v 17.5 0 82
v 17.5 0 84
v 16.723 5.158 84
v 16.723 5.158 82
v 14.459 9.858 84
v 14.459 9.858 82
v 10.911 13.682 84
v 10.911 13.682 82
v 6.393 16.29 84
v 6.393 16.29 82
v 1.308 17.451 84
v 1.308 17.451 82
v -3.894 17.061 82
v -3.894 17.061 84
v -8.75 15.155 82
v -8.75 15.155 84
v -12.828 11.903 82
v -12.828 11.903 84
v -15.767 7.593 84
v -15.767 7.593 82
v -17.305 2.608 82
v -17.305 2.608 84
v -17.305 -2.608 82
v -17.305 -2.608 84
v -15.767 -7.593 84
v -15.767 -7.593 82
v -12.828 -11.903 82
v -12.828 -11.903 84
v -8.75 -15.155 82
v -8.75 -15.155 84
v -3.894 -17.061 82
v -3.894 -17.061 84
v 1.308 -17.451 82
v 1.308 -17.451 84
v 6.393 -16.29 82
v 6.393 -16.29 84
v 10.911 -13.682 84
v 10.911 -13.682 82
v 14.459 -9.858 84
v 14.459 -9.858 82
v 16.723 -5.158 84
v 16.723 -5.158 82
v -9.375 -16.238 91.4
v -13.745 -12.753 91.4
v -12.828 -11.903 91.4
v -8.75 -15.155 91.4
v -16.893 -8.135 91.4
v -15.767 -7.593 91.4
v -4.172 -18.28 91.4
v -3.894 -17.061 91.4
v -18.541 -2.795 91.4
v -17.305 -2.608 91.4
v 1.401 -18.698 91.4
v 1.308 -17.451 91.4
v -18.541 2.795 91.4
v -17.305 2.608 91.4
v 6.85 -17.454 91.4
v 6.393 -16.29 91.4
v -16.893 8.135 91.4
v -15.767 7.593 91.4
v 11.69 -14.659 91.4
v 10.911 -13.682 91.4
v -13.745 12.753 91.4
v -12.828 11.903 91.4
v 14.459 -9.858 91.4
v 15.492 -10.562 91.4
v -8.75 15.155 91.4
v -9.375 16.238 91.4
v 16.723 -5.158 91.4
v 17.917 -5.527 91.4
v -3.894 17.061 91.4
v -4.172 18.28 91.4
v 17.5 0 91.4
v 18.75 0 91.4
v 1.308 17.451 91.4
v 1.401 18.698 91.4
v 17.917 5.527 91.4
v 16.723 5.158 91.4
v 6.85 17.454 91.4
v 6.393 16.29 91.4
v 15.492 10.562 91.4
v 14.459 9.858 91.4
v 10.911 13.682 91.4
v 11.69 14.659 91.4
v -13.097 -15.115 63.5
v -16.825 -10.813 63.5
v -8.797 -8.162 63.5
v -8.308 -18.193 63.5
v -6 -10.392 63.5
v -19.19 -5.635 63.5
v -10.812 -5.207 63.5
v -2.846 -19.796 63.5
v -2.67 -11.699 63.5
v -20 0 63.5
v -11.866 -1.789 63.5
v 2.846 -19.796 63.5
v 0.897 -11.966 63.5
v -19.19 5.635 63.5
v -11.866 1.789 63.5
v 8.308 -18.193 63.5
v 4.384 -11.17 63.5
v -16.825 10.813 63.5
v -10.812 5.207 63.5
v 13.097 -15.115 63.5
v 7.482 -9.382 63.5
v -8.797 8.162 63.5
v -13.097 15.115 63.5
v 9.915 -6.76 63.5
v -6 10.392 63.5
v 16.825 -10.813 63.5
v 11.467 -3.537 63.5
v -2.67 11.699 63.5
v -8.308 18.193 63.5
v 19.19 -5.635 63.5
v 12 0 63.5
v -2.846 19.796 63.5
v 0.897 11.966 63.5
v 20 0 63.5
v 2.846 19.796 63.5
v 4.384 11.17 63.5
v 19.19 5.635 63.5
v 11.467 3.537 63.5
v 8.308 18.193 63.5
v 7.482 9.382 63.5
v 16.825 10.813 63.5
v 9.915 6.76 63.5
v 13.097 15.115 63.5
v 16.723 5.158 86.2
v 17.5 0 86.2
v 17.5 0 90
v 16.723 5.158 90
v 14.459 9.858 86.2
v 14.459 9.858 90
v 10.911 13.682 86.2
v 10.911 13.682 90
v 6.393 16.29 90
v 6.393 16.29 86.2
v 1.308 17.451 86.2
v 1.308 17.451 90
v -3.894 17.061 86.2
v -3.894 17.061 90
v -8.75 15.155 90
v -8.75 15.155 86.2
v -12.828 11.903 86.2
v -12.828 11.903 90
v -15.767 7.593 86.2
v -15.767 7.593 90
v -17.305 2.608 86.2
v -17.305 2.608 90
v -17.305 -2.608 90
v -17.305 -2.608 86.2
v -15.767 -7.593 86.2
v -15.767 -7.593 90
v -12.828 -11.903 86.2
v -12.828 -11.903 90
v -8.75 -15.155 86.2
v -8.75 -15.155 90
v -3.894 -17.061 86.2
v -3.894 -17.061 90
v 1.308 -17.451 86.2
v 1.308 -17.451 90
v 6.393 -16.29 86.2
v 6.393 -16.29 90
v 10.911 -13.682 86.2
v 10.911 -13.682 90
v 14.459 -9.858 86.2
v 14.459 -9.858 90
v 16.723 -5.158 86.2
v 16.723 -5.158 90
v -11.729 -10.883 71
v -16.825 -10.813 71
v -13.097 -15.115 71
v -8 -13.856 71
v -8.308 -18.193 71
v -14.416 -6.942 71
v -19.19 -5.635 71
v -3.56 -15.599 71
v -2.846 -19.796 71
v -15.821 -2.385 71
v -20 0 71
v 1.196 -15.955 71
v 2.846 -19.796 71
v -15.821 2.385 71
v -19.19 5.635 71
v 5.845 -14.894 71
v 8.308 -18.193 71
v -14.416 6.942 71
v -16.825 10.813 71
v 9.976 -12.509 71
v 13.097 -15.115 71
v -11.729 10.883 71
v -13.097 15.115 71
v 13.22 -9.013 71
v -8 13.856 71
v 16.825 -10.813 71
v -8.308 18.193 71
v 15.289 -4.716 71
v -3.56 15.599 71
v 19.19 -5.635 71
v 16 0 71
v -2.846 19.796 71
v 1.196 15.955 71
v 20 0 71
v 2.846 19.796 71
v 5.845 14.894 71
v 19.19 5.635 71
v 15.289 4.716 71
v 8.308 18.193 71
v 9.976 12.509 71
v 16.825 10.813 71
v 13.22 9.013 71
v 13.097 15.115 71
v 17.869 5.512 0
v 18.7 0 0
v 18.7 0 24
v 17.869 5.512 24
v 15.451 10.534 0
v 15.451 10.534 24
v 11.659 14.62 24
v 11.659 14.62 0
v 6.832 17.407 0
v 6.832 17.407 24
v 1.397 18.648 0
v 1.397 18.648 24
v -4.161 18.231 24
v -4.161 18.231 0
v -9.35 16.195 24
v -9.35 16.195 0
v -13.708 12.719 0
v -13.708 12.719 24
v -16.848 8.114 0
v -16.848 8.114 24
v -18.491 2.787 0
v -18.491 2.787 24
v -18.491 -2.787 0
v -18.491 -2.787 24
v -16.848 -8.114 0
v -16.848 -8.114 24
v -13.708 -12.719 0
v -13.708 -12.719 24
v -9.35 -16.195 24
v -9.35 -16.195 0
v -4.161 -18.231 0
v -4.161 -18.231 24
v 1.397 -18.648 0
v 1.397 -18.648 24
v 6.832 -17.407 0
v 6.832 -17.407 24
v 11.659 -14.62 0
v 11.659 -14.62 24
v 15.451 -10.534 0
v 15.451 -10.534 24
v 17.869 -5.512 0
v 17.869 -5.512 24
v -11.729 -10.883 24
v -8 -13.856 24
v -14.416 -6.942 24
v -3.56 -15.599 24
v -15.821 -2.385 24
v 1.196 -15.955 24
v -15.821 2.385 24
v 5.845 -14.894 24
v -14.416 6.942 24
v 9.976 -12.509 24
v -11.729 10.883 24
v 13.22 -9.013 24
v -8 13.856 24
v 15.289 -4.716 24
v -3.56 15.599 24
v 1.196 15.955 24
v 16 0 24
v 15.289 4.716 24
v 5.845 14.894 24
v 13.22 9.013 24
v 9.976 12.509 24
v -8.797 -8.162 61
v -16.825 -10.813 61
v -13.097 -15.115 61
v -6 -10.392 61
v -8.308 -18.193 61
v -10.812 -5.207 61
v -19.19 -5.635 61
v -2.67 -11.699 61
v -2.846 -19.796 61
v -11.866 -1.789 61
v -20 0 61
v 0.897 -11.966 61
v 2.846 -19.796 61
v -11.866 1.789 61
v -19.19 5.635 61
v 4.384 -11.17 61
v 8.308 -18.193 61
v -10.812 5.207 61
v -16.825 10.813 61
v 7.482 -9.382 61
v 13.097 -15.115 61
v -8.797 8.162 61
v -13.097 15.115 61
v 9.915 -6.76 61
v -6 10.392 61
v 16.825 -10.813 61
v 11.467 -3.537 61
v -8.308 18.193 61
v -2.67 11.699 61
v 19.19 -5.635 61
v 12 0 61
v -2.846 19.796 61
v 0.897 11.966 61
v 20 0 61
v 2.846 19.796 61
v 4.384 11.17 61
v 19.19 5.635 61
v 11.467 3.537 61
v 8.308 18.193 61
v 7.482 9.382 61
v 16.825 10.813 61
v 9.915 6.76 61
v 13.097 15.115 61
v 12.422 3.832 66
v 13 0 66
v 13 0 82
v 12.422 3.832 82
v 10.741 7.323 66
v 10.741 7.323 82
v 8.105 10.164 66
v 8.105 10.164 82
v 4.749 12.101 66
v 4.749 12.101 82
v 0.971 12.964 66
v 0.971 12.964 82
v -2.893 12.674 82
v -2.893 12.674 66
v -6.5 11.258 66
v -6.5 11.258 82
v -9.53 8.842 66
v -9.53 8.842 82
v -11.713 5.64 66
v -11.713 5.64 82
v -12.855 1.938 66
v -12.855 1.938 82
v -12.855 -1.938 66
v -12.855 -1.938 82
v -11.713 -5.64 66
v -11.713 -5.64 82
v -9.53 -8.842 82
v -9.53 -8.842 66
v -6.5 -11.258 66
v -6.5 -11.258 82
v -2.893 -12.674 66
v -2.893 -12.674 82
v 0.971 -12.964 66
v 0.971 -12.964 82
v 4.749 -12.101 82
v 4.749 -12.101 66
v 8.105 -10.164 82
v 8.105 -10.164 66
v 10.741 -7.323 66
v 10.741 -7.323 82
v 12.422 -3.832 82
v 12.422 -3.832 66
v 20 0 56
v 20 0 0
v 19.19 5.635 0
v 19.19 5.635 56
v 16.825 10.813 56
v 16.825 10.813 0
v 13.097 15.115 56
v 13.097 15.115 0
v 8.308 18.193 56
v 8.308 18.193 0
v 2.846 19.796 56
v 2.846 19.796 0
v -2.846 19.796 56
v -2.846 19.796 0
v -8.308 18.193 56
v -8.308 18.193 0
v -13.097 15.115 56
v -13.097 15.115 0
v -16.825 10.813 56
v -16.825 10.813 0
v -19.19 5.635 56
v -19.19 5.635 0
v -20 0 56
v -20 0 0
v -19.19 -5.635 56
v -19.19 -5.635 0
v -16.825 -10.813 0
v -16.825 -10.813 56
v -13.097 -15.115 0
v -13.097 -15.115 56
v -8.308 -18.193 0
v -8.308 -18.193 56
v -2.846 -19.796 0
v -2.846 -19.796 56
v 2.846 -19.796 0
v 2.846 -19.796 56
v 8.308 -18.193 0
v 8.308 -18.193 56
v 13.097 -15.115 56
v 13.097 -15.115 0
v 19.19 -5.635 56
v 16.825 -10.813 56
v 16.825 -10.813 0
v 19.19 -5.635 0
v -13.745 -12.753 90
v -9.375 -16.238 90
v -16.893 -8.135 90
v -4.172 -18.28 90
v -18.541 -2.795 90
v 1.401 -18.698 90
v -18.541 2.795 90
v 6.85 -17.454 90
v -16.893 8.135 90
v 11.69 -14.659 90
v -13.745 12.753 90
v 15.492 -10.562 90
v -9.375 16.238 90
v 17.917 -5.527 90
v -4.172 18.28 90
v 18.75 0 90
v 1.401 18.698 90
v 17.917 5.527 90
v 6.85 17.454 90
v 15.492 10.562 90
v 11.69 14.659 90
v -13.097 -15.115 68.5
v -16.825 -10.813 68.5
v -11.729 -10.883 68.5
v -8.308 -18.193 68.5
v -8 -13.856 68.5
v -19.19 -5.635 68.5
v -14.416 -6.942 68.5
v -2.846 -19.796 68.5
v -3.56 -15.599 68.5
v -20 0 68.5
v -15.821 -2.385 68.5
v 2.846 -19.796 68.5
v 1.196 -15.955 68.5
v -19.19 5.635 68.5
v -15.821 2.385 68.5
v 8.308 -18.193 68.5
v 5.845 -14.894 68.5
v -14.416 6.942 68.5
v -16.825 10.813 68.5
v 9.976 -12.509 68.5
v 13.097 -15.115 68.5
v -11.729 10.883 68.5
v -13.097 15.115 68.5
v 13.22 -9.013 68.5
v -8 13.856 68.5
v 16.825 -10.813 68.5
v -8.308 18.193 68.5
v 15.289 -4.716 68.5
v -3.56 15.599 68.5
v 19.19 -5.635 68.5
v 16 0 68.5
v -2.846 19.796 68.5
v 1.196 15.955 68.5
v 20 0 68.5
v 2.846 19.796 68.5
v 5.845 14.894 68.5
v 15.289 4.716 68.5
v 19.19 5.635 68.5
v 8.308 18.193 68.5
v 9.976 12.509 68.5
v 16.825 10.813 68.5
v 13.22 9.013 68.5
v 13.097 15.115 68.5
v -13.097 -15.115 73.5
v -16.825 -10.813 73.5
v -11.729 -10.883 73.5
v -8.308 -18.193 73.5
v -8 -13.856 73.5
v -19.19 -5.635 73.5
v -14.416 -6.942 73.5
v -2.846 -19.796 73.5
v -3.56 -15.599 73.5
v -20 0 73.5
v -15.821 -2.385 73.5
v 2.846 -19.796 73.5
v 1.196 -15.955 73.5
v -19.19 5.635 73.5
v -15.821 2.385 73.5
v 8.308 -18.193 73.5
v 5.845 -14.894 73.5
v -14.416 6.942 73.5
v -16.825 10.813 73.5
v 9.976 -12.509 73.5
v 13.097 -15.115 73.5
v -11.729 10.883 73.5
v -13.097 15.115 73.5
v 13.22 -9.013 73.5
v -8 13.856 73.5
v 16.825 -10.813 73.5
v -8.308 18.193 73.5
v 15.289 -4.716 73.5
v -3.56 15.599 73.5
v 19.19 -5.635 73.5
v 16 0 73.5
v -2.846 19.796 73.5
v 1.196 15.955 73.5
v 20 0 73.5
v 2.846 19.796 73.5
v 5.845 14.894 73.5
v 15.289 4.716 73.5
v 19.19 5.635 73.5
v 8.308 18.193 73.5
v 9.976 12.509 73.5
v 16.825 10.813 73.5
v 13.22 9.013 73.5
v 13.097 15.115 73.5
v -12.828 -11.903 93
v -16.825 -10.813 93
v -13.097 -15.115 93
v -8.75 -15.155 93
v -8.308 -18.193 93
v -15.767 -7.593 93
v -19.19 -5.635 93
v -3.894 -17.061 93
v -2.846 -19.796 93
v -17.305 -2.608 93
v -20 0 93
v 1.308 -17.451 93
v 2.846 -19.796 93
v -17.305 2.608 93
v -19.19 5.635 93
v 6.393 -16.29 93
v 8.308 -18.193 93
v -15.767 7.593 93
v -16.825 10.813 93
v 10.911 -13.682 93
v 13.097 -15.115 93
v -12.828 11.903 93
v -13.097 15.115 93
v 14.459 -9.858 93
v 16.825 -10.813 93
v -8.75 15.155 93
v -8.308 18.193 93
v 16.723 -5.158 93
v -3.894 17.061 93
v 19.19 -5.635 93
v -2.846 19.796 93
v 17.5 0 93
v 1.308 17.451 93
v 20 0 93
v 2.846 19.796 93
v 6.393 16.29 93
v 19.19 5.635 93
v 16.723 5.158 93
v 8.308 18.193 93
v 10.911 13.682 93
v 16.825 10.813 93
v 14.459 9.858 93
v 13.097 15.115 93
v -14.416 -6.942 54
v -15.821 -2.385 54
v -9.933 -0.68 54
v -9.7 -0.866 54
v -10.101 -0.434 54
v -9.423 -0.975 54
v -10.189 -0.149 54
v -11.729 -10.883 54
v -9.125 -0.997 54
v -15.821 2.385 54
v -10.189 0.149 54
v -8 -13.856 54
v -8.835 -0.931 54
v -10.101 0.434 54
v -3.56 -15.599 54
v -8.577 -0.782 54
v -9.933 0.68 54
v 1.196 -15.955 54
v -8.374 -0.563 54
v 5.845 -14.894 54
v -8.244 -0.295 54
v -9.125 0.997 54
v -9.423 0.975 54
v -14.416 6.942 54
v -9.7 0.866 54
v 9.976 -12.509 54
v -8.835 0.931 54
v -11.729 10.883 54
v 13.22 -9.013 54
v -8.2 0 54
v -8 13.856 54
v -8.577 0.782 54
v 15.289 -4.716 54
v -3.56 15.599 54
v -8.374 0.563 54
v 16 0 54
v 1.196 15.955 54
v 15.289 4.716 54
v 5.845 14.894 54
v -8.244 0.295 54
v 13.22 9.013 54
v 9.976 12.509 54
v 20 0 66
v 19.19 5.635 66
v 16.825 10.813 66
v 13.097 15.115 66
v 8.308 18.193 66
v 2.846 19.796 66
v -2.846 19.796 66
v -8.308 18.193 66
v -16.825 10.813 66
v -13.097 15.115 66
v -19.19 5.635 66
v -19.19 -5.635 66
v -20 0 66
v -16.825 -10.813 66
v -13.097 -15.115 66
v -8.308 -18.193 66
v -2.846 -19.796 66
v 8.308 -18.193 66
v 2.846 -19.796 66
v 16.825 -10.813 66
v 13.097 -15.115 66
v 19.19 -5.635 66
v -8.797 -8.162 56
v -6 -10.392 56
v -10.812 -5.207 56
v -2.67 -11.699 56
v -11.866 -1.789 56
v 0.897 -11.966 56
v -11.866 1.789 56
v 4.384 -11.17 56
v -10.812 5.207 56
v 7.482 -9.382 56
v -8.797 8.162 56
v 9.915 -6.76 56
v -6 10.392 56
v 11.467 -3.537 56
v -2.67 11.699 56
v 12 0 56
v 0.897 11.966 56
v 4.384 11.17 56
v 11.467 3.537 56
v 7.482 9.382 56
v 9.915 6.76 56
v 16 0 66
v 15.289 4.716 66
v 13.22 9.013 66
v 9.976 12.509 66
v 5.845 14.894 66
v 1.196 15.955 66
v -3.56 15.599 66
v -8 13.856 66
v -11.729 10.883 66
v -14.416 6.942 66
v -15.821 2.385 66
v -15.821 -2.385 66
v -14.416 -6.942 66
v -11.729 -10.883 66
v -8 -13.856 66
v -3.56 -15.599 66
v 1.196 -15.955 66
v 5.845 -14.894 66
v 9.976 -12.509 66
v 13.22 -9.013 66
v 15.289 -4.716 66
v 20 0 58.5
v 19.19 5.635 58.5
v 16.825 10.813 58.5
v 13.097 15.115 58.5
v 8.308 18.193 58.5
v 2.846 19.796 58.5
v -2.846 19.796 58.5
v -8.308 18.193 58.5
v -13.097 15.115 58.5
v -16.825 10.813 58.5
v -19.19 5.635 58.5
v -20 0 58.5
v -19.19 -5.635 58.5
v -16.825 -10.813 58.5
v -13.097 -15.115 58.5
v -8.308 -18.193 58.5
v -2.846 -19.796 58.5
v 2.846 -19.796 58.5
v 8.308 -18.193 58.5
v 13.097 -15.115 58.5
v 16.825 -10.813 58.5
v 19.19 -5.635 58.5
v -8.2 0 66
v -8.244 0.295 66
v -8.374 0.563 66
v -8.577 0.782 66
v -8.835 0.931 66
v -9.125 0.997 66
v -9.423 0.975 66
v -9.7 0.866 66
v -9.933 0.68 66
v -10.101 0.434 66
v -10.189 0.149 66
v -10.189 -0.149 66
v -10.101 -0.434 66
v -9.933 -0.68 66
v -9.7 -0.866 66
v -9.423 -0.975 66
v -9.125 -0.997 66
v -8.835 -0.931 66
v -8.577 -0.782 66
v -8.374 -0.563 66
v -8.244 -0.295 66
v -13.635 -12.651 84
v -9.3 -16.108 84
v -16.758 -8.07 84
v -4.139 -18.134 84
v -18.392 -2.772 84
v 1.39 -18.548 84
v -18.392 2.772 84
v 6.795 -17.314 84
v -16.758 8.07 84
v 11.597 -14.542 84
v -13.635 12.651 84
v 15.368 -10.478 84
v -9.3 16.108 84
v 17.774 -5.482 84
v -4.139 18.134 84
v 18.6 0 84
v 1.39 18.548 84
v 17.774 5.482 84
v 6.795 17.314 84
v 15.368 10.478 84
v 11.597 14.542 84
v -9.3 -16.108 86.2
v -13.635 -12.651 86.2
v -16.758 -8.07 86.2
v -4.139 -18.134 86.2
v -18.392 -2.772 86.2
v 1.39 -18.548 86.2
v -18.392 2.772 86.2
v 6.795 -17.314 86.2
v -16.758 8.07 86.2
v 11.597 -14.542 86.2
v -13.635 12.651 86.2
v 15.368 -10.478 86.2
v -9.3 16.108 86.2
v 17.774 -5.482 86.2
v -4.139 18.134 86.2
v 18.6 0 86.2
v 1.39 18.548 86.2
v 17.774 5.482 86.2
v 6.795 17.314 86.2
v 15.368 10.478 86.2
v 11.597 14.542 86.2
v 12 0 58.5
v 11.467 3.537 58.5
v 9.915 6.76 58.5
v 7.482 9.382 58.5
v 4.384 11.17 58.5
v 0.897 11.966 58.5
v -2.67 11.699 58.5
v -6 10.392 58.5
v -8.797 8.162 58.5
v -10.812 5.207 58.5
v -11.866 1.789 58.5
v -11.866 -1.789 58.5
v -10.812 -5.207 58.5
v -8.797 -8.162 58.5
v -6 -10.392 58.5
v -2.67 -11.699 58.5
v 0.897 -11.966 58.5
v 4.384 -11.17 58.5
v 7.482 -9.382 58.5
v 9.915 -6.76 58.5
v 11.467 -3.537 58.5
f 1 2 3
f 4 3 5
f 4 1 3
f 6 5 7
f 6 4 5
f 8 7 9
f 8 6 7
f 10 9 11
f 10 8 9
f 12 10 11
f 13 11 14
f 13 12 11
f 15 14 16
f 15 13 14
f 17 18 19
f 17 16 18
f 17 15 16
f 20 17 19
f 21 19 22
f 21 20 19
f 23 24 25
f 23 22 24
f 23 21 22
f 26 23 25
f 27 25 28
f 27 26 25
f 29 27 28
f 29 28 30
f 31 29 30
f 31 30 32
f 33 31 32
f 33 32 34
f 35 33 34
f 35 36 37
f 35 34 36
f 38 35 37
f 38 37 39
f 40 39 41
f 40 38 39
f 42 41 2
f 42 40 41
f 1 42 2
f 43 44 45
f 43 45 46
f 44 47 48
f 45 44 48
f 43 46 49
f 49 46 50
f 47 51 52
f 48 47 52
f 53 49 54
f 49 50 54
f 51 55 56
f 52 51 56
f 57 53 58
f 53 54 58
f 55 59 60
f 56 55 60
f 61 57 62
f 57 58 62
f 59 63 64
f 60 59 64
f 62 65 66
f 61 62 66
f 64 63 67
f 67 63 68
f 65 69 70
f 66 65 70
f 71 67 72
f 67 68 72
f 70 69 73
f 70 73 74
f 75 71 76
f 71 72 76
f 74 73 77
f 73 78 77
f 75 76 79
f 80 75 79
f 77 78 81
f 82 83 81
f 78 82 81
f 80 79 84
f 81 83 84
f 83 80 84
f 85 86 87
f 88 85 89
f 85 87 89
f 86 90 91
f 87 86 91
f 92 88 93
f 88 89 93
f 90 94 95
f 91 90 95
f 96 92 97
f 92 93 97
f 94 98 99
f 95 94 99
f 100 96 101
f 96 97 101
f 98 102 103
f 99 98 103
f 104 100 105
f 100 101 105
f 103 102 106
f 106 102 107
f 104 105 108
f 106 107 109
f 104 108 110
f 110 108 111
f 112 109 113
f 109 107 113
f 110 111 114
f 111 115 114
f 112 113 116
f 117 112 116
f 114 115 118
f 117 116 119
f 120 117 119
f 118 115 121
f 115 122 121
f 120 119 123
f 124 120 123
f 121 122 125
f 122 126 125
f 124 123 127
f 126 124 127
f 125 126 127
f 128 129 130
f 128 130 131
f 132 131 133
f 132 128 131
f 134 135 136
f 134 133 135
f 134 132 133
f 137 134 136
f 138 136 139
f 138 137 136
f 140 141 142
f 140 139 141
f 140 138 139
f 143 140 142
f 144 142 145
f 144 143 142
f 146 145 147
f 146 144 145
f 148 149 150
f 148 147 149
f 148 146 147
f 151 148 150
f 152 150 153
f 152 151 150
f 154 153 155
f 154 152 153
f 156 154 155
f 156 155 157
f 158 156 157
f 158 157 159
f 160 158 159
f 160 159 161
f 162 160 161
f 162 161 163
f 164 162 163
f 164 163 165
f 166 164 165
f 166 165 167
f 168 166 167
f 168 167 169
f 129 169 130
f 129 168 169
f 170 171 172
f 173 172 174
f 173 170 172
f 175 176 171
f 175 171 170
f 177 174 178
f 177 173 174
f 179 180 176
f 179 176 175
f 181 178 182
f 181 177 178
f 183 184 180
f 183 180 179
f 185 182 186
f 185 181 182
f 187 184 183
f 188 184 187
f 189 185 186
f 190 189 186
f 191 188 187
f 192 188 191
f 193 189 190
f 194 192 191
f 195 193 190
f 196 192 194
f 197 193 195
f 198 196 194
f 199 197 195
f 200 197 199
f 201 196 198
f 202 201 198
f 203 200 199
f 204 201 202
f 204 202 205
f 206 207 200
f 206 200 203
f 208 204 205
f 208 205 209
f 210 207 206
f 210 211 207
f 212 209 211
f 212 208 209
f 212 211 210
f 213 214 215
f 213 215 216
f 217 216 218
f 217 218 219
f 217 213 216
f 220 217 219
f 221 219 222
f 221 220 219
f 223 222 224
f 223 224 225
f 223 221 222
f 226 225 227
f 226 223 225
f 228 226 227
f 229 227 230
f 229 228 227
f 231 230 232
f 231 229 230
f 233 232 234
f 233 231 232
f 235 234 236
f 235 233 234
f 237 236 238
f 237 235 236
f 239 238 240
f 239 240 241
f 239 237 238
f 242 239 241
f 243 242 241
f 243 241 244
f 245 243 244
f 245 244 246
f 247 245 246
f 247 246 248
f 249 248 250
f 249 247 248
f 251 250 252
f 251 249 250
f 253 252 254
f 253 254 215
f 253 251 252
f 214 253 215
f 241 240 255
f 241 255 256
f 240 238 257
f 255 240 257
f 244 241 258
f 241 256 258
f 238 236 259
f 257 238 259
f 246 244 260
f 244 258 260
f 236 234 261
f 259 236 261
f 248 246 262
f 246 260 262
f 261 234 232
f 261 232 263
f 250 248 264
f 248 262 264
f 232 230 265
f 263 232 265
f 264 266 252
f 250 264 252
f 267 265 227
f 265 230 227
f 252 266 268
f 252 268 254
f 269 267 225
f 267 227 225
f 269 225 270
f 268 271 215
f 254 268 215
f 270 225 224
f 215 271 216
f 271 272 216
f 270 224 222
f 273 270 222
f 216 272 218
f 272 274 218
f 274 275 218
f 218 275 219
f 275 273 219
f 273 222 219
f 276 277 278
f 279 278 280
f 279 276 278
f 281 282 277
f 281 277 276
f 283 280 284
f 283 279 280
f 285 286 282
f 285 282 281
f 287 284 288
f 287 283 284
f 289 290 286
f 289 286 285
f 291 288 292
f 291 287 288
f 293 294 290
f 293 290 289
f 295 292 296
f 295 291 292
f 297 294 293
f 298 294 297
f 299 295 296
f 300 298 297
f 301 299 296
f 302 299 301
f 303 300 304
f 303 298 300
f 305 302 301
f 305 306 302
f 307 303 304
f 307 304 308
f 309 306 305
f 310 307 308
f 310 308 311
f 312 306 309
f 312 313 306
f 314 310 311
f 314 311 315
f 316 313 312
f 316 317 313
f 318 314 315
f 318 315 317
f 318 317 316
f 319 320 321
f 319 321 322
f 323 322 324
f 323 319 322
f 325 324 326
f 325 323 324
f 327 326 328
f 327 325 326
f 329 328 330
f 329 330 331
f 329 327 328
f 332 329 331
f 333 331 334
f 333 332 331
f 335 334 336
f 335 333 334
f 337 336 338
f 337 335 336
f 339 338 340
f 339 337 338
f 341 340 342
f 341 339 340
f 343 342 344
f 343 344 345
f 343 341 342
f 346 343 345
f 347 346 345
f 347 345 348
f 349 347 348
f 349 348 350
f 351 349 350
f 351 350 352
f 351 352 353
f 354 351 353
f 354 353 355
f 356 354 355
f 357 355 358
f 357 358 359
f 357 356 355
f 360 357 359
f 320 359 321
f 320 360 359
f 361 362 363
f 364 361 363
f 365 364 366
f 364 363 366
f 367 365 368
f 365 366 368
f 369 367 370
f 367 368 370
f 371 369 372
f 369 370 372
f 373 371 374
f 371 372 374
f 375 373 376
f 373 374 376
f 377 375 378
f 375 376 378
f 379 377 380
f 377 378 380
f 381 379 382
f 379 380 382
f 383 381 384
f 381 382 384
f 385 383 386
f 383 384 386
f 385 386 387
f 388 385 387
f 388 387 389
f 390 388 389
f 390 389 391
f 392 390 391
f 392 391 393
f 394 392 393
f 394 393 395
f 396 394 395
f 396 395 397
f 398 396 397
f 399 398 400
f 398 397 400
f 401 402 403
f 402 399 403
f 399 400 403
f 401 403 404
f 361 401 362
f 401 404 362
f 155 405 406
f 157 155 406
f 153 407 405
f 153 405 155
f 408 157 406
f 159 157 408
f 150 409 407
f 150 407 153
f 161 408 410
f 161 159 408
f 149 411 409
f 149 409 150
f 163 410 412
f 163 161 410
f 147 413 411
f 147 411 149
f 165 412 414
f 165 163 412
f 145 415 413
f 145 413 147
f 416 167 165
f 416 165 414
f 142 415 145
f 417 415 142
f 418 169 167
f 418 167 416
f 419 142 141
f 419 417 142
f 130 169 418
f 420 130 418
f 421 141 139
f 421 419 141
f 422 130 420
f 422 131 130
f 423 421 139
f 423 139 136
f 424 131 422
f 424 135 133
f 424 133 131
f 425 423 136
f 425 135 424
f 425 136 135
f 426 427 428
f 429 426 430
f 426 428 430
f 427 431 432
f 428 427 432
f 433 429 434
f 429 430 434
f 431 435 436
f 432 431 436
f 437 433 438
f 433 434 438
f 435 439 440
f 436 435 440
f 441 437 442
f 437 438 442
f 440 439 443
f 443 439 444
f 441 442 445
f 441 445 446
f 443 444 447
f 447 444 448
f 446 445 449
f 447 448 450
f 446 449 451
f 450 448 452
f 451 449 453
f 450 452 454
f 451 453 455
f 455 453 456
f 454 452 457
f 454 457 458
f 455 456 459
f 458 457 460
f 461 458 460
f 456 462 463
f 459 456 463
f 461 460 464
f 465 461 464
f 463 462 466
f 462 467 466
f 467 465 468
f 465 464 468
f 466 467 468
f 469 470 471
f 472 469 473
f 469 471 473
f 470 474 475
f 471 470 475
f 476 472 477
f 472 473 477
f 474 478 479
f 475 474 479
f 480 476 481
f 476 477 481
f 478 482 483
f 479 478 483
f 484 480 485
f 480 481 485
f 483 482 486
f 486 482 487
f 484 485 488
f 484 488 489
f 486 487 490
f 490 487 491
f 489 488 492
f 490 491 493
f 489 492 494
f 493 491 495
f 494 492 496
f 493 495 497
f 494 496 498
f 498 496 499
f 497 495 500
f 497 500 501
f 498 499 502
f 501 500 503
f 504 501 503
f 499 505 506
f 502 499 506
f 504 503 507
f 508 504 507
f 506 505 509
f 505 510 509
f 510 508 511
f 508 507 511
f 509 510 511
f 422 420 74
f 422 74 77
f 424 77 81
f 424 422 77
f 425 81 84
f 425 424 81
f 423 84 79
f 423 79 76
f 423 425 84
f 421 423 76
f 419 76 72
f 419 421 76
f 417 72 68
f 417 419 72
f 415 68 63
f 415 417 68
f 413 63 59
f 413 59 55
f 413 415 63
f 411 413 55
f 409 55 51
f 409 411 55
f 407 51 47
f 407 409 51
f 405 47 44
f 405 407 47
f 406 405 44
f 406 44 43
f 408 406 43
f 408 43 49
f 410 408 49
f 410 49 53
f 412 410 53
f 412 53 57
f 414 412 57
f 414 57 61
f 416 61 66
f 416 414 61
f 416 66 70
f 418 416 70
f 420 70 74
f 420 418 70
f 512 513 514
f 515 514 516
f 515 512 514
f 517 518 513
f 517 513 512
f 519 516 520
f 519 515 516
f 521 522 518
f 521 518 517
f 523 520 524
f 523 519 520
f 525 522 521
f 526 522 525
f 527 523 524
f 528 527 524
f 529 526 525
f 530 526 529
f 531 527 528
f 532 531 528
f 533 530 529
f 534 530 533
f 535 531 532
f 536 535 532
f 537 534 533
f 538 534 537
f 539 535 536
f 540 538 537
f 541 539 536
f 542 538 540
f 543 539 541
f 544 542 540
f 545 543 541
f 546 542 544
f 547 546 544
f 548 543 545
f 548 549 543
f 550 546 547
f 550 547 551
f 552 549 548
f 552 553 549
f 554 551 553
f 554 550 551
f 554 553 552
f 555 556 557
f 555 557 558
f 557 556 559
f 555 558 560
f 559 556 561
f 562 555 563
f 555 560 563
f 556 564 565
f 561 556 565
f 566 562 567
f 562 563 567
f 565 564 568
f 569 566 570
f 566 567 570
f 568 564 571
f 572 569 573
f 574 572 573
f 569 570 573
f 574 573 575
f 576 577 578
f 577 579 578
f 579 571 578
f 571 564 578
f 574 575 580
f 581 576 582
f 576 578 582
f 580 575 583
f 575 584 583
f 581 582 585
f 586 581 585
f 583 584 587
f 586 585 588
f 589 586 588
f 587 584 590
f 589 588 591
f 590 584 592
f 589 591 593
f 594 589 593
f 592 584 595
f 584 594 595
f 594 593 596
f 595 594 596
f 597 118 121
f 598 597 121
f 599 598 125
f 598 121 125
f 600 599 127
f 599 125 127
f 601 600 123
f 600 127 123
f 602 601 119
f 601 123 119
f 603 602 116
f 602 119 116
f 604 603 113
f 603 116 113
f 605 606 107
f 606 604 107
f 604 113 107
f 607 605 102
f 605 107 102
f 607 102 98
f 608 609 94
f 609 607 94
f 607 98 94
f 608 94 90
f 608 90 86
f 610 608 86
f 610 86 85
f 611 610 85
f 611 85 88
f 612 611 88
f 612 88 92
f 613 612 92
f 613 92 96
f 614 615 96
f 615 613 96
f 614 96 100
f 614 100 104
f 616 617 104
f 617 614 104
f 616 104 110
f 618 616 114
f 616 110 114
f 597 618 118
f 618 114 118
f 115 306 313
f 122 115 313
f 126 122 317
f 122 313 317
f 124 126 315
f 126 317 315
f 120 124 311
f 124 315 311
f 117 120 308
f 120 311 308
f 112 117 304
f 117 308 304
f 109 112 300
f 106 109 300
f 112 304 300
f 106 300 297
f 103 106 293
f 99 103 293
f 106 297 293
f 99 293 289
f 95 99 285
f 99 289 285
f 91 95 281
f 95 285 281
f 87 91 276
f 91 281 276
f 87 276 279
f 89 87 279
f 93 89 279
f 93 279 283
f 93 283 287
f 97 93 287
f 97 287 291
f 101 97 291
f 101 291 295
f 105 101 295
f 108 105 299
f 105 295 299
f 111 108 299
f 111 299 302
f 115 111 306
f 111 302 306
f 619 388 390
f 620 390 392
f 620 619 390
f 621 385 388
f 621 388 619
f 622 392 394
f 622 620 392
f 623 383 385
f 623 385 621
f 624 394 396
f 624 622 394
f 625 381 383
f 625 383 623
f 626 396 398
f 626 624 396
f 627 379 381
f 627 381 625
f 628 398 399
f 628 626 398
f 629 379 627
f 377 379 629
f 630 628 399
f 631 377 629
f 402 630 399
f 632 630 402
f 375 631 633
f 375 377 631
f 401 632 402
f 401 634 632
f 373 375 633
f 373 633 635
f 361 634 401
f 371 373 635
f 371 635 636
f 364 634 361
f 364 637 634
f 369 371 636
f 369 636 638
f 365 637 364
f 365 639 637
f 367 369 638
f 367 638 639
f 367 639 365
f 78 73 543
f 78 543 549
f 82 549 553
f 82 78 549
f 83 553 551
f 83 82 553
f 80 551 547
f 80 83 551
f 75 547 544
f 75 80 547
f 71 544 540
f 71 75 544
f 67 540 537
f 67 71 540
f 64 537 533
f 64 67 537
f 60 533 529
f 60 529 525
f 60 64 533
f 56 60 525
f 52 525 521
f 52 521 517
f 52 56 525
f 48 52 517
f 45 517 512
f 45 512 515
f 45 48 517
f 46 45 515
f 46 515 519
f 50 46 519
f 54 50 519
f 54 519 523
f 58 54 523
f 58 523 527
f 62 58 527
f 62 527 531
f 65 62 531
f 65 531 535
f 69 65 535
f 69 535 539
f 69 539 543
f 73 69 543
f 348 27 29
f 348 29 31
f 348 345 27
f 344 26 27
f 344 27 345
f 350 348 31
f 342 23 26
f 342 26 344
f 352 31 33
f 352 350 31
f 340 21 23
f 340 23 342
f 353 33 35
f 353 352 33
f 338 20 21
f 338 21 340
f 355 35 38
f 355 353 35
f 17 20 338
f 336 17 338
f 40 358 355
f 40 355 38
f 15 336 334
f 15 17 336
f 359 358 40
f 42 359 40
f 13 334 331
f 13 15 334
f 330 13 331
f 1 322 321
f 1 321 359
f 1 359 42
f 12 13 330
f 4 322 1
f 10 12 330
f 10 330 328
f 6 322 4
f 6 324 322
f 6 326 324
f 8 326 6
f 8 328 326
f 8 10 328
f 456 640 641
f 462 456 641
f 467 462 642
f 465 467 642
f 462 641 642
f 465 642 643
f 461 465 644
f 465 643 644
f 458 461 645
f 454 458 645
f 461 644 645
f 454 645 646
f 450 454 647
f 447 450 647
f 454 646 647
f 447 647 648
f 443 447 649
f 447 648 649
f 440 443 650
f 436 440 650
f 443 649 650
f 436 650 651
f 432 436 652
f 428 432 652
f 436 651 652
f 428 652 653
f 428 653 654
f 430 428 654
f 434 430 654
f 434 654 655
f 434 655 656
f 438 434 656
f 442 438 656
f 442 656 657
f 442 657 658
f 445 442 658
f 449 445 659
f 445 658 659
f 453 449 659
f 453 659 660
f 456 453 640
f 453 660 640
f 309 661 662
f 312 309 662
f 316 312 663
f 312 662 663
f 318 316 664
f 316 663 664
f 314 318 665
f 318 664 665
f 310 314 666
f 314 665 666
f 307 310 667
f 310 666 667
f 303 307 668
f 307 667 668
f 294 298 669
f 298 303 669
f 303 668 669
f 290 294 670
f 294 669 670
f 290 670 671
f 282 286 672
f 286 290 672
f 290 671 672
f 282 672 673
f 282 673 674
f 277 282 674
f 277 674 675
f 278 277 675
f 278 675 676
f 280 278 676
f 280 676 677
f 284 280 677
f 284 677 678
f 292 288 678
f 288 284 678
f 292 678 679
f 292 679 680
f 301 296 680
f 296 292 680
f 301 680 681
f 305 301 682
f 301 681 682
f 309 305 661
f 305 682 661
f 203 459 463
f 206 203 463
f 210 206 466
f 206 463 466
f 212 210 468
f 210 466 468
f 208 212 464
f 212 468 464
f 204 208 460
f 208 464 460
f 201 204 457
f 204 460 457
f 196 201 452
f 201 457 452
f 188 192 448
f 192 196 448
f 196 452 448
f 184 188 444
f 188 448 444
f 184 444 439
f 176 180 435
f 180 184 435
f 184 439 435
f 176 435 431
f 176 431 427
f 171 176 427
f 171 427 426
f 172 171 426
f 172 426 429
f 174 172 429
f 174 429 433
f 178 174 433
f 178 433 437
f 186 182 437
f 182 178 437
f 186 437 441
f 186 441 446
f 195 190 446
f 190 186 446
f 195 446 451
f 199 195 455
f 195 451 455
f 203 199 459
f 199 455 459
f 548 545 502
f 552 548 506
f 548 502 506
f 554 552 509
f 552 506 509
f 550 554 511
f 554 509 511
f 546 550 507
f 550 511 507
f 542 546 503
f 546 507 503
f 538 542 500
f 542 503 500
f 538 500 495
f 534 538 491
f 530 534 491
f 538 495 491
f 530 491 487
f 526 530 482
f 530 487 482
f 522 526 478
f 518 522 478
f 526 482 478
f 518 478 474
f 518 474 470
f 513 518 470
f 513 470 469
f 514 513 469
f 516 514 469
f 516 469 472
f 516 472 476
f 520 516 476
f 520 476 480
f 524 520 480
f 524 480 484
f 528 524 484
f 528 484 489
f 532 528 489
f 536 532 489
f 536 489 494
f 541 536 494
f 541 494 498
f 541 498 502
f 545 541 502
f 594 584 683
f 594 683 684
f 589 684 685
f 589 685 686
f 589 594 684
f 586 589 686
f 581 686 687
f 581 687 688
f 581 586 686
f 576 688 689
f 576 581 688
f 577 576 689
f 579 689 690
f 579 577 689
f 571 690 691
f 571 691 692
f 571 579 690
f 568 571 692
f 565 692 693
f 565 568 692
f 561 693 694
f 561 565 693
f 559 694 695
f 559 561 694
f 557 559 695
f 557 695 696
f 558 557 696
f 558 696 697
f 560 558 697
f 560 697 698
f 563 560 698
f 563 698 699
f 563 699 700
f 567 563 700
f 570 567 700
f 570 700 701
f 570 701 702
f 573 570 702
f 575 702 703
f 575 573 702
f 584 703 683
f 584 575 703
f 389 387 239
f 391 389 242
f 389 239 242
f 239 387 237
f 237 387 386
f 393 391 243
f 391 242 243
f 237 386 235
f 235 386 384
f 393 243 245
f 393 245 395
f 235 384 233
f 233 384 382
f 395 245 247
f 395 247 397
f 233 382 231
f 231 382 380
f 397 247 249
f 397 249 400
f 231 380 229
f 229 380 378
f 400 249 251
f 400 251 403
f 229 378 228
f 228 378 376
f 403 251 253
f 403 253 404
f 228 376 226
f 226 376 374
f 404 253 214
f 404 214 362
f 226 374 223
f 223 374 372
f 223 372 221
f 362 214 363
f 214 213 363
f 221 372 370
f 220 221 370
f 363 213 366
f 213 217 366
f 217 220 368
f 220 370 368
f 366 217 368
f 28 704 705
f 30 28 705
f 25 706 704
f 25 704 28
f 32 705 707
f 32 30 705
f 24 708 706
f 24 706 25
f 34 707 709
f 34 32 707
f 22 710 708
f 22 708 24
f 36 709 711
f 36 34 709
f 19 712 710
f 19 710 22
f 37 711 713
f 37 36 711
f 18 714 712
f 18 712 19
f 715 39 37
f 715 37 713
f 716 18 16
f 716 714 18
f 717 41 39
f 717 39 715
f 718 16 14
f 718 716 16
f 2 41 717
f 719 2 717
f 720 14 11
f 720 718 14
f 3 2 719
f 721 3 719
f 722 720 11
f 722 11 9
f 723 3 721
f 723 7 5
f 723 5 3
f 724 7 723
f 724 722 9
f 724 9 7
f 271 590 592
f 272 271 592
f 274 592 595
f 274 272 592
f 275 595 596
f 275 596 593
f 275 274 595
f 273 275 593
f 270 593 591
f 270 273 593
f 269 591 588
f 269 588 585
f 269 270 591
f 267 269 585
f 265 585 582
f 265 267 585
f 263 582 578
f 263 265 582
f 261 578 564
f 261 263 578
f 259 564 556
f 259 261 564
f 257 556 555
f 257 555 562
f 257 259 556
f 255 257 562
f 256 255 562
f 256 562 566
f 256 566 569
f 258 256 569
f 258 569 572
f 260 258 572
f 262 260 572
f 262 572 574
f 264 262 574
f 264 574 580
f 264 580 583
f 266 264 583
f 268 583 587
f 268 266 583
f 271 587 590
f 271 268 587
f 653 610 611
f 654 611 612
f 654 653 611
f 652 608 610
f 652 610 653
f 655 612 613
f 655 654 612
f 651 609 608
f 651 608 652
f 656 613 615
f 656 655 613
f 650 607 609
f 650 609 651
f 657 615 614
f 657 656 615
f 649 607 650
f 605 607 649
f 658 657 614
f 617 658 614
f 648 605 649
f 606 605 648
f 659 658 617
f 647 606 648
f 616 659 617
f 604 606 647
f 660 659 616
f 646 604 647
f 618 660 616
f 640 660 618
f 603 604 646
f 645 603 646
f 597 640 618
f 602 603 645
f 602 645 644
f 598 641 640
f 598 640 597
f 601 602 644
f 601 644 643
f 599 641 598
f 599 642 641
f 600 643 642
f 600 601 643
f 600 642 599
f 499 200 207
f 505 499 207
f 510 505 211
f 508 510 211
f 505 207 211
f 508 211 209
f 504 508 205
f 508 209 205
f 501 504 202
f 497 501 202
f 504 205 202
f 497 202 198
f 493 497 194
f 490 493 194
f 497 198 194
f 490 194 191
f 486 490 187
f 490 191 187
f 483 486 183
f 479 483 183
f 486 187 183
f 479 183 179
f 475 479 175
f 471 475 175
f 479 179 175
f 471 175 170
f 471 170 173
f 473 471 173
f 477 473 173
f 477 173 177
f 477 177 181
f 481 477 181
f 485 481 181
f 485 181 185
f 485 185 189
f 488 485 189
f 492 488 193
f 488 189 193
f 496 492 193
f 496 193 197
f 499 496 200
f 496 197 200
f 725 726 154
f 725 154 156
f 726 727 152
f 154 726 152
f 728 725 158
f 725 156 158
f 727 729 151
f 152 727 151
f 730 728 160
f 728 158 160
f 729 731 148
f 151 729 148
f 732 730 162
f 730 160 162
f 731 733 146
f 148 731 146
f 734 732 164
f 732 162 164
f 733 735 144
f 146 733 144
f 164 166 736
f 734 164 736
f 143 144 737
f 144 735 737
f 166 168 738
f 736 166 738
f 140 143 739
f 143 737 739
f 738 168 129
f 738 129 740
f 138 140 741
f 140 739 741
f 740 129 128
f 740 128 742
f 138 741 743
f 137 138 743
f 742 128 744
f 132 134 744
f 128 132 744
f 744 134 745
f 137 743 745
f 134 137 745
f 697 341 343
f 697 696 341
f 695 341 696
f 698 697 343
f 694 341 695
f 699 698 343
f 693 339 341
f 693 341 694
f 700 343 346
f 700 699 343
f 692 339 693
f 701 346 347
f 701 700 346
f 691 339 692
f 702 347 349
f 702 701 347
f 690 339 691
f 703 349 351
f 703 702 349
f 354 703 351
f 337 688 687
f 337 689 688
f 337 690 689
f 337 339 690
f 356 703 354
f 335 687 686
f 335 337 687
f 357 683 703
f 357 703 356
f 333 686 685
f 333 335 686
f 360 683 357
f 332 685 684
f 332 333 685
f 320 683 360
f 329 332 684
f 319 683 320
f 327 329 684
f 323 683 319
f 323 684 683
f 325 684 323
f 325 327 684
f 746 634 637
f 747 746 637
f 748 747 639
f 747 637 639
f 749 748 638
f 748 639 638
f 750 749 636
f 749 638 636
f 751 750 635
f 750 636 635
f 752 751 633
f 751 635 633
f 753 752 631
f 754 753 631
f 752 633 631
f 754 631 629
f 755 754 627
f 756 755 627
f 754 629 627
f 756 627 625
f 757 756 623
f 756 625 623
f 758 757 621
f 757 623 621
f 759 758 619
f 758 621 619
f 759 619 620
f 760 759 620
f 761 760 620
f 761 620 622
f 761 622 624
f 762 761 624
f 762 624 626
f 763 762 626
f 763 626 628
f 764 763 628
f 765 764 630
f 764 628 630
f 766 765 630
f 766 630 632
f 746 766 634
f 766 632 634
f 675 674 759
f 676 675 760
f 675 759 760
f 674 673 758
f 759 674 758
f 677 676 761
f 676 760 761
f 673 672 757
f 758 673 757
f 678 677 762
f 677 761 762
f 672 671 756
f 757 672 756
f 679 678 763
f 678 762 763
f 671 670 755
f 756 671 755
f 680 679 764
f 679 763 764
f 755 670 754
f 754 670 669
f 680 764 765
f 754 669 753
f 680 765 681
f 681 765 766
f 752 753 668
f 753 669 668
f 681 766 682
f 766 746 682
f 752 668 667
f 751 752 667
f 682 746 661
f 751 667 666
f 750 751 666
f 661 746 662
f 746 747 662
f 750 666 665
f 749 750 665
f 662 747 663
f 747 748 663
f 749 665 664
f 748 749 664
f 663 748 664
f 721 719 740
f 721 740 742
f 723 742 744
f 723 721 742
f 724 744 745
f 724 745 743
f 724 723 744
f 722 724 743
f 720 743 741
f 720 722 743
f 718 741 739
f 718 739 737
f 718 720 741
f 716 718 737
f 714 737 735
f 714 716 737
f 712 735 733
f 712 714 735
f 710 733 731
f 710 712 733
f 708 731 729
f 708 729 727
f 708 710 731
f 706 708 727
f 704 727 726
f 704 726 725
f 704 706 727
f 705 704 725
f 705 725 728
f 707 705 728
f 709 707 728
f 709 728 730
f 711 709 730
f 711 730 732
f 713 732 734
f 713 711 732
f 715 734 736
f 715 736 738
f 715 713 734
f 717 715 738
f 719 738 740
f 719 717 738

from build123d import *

# Parameters (mm, degrees)
CYLINDER002_R     = 18.75
CYLINDER002_DEPTH = 1.4
CYLINDER001_R     = 18.6
CYLINDER001_DEPTH = 2.2
SKETCH_R          = 18.7
PAD_DEPTH         = 24
SKETCH001_R       = 16
PAD001_DEPTH      = 30
SKETCH002_R       = 1
PAD002_DEPTH      = 12
SKETCH003_R       = 13
PAD003_DEPTH      = 16
SKETCH004_R       = 17.5
PAD004_DEPTH      = 11
SKETCH008_R       = 22
SKETCH008_R_2     = 12
PAD008_DEPTH      = 2.5
SKETCH007_R       = 22
SKETCH007_R_2     = 12
PAD007_DEPTH      = 2.5
SKETCH006_R       = 22
SKETCH006_R_2     = 16
PAD006_DEPTH      = 2.5
SKETCH005_R       = 22
SKETCH005_R_2     = 16
PAD005_DEPTH      = 2.5
CYLINDER_R        = 20
CYLINDER_DEPTH    = 93


with BuildPart() as nut_sprengring_rb35:
    # Cylinder002 → Cylinder002 (new body)
    with BuildSketch(Plane.XY.offset(90)):
        Circle(CYLINDER002_R)
    extrude(amount=CYLINDER002_DEPTH)


with BuildPart() as nut_radial:
    # Cylinder001 → Cylinder001 (new body)
    with BuildSketch(Plane.XY.offset(84)):
        Circle(CYLINDER001_R)
    extrude(amount=CYLINDER001_DEPTH)


with BuildPart() as raum_glas:
    # Sketch → Pad (new body)
    with BuildSketch(Plane.XY):
        Circle(SKETCH_R)
    extrude(amount=PAD_DEPTH)

    # Sketch001 → Pad001 (new body)
    with BuildSketch(Plane.XY.offset(24)):
        Circle(SKETCH001_R)
    extrude(amount=PAD001_DEPTH)

    # Sketch002 → Pad002 (new body)
    with BuildSketch(Plane.XY.offset(54)):
        with Locations((-9.2, 0)):
            Circle(SKETCH002_R)
    extrude(amount=PAD002_DEPTH)

    # Sketch003 → Pad003 (new body)
    with BuildSketch(Plane.XY.offset(66)):
        Circle(SKETCH003_R)
    extrude(amount=PAD003_DEPTH)

    # Sketch004 → Pad004 (new body)
    with BuildSketch(Plane.XY.offset(82)):
        Circle(SKETCH004_R)
    extrude(amount=PAD004_DEPTH)


with BuildPart() as pad008:
    # Sketch008 → Pad008 (new body)
    with BuildSketch(Plane.XY.offset(56)):
        Circle(SKETCH008_R)
        Circle(SKETCH008_R_2, mode=Mode.SUBTRACT)
    extrude(amount=PAD008_DEPTH)


with BuildPart() as pad007:
    # Sketch007 → Pad007 (new body)
    with BuildSketch(Plane.XY.offset(61)):
        Circle(SKETCH007_R)
        Circle(SKETCH007_R_2, mode=Mode.SUBTRACT)
    extrude(amount=PAD007_DEPTH)


with BuildPart() as pad006:
    # Sketch006 → Pad006 (new body)
    with BuildSketch(Plane.XY.offset(71)):
        Circle(SKETCH006_R)
        Circle(SKETCH006_R_2, mode=Mode.SUBTRACT)
    extrude(amount=PAD006_DEPTH)


with BuildPart() as pad005:
    # Sketch005 → Pad005 (new body)
    with BuildSketch(Plane.XY.offset(66)):
        Circle(SKETCH005_R)
        Circle(SKETCH005_R_2, mode=Mode.SUBTRACT)
    extrude(amount=PAD005_DEPTH)


with BuildPart() as cut012:
    # Cylinder → Cylinder (new body)
    with BuildSketch(Plane.XY):
        Circle(CYLINDER_R)
    extrude(amount=CYLINDER_DEPTH)

    # Cut: cut Pad005
    add(pad005.part, mode=Mode.SUBTRACT)

    # Cut001: cut Pad006
    add(pad006.part, mode=Mode.SUBTRACT)

    # Cut002: cut Pad007
    add(pad007.part, mode=Mode.SUBTRACT)

    # Cut003: cut Pad008
    add(pad008.part, mode=Mode.SUBTRACT)

    # Cut010: cut Raum Glas
    add(raum_glas.part, mode=Mode.SUBTRACT)

    # Cut011: cut Nut Radial
    add(nut_radial.part, mode=Mode.SUBTRACT)

    # Cut012: cut Nut Sprengring RB35
    add(nut_sprengring_rb35.part, mode=Mode.SUBTRACT)


solid = cut012.part
